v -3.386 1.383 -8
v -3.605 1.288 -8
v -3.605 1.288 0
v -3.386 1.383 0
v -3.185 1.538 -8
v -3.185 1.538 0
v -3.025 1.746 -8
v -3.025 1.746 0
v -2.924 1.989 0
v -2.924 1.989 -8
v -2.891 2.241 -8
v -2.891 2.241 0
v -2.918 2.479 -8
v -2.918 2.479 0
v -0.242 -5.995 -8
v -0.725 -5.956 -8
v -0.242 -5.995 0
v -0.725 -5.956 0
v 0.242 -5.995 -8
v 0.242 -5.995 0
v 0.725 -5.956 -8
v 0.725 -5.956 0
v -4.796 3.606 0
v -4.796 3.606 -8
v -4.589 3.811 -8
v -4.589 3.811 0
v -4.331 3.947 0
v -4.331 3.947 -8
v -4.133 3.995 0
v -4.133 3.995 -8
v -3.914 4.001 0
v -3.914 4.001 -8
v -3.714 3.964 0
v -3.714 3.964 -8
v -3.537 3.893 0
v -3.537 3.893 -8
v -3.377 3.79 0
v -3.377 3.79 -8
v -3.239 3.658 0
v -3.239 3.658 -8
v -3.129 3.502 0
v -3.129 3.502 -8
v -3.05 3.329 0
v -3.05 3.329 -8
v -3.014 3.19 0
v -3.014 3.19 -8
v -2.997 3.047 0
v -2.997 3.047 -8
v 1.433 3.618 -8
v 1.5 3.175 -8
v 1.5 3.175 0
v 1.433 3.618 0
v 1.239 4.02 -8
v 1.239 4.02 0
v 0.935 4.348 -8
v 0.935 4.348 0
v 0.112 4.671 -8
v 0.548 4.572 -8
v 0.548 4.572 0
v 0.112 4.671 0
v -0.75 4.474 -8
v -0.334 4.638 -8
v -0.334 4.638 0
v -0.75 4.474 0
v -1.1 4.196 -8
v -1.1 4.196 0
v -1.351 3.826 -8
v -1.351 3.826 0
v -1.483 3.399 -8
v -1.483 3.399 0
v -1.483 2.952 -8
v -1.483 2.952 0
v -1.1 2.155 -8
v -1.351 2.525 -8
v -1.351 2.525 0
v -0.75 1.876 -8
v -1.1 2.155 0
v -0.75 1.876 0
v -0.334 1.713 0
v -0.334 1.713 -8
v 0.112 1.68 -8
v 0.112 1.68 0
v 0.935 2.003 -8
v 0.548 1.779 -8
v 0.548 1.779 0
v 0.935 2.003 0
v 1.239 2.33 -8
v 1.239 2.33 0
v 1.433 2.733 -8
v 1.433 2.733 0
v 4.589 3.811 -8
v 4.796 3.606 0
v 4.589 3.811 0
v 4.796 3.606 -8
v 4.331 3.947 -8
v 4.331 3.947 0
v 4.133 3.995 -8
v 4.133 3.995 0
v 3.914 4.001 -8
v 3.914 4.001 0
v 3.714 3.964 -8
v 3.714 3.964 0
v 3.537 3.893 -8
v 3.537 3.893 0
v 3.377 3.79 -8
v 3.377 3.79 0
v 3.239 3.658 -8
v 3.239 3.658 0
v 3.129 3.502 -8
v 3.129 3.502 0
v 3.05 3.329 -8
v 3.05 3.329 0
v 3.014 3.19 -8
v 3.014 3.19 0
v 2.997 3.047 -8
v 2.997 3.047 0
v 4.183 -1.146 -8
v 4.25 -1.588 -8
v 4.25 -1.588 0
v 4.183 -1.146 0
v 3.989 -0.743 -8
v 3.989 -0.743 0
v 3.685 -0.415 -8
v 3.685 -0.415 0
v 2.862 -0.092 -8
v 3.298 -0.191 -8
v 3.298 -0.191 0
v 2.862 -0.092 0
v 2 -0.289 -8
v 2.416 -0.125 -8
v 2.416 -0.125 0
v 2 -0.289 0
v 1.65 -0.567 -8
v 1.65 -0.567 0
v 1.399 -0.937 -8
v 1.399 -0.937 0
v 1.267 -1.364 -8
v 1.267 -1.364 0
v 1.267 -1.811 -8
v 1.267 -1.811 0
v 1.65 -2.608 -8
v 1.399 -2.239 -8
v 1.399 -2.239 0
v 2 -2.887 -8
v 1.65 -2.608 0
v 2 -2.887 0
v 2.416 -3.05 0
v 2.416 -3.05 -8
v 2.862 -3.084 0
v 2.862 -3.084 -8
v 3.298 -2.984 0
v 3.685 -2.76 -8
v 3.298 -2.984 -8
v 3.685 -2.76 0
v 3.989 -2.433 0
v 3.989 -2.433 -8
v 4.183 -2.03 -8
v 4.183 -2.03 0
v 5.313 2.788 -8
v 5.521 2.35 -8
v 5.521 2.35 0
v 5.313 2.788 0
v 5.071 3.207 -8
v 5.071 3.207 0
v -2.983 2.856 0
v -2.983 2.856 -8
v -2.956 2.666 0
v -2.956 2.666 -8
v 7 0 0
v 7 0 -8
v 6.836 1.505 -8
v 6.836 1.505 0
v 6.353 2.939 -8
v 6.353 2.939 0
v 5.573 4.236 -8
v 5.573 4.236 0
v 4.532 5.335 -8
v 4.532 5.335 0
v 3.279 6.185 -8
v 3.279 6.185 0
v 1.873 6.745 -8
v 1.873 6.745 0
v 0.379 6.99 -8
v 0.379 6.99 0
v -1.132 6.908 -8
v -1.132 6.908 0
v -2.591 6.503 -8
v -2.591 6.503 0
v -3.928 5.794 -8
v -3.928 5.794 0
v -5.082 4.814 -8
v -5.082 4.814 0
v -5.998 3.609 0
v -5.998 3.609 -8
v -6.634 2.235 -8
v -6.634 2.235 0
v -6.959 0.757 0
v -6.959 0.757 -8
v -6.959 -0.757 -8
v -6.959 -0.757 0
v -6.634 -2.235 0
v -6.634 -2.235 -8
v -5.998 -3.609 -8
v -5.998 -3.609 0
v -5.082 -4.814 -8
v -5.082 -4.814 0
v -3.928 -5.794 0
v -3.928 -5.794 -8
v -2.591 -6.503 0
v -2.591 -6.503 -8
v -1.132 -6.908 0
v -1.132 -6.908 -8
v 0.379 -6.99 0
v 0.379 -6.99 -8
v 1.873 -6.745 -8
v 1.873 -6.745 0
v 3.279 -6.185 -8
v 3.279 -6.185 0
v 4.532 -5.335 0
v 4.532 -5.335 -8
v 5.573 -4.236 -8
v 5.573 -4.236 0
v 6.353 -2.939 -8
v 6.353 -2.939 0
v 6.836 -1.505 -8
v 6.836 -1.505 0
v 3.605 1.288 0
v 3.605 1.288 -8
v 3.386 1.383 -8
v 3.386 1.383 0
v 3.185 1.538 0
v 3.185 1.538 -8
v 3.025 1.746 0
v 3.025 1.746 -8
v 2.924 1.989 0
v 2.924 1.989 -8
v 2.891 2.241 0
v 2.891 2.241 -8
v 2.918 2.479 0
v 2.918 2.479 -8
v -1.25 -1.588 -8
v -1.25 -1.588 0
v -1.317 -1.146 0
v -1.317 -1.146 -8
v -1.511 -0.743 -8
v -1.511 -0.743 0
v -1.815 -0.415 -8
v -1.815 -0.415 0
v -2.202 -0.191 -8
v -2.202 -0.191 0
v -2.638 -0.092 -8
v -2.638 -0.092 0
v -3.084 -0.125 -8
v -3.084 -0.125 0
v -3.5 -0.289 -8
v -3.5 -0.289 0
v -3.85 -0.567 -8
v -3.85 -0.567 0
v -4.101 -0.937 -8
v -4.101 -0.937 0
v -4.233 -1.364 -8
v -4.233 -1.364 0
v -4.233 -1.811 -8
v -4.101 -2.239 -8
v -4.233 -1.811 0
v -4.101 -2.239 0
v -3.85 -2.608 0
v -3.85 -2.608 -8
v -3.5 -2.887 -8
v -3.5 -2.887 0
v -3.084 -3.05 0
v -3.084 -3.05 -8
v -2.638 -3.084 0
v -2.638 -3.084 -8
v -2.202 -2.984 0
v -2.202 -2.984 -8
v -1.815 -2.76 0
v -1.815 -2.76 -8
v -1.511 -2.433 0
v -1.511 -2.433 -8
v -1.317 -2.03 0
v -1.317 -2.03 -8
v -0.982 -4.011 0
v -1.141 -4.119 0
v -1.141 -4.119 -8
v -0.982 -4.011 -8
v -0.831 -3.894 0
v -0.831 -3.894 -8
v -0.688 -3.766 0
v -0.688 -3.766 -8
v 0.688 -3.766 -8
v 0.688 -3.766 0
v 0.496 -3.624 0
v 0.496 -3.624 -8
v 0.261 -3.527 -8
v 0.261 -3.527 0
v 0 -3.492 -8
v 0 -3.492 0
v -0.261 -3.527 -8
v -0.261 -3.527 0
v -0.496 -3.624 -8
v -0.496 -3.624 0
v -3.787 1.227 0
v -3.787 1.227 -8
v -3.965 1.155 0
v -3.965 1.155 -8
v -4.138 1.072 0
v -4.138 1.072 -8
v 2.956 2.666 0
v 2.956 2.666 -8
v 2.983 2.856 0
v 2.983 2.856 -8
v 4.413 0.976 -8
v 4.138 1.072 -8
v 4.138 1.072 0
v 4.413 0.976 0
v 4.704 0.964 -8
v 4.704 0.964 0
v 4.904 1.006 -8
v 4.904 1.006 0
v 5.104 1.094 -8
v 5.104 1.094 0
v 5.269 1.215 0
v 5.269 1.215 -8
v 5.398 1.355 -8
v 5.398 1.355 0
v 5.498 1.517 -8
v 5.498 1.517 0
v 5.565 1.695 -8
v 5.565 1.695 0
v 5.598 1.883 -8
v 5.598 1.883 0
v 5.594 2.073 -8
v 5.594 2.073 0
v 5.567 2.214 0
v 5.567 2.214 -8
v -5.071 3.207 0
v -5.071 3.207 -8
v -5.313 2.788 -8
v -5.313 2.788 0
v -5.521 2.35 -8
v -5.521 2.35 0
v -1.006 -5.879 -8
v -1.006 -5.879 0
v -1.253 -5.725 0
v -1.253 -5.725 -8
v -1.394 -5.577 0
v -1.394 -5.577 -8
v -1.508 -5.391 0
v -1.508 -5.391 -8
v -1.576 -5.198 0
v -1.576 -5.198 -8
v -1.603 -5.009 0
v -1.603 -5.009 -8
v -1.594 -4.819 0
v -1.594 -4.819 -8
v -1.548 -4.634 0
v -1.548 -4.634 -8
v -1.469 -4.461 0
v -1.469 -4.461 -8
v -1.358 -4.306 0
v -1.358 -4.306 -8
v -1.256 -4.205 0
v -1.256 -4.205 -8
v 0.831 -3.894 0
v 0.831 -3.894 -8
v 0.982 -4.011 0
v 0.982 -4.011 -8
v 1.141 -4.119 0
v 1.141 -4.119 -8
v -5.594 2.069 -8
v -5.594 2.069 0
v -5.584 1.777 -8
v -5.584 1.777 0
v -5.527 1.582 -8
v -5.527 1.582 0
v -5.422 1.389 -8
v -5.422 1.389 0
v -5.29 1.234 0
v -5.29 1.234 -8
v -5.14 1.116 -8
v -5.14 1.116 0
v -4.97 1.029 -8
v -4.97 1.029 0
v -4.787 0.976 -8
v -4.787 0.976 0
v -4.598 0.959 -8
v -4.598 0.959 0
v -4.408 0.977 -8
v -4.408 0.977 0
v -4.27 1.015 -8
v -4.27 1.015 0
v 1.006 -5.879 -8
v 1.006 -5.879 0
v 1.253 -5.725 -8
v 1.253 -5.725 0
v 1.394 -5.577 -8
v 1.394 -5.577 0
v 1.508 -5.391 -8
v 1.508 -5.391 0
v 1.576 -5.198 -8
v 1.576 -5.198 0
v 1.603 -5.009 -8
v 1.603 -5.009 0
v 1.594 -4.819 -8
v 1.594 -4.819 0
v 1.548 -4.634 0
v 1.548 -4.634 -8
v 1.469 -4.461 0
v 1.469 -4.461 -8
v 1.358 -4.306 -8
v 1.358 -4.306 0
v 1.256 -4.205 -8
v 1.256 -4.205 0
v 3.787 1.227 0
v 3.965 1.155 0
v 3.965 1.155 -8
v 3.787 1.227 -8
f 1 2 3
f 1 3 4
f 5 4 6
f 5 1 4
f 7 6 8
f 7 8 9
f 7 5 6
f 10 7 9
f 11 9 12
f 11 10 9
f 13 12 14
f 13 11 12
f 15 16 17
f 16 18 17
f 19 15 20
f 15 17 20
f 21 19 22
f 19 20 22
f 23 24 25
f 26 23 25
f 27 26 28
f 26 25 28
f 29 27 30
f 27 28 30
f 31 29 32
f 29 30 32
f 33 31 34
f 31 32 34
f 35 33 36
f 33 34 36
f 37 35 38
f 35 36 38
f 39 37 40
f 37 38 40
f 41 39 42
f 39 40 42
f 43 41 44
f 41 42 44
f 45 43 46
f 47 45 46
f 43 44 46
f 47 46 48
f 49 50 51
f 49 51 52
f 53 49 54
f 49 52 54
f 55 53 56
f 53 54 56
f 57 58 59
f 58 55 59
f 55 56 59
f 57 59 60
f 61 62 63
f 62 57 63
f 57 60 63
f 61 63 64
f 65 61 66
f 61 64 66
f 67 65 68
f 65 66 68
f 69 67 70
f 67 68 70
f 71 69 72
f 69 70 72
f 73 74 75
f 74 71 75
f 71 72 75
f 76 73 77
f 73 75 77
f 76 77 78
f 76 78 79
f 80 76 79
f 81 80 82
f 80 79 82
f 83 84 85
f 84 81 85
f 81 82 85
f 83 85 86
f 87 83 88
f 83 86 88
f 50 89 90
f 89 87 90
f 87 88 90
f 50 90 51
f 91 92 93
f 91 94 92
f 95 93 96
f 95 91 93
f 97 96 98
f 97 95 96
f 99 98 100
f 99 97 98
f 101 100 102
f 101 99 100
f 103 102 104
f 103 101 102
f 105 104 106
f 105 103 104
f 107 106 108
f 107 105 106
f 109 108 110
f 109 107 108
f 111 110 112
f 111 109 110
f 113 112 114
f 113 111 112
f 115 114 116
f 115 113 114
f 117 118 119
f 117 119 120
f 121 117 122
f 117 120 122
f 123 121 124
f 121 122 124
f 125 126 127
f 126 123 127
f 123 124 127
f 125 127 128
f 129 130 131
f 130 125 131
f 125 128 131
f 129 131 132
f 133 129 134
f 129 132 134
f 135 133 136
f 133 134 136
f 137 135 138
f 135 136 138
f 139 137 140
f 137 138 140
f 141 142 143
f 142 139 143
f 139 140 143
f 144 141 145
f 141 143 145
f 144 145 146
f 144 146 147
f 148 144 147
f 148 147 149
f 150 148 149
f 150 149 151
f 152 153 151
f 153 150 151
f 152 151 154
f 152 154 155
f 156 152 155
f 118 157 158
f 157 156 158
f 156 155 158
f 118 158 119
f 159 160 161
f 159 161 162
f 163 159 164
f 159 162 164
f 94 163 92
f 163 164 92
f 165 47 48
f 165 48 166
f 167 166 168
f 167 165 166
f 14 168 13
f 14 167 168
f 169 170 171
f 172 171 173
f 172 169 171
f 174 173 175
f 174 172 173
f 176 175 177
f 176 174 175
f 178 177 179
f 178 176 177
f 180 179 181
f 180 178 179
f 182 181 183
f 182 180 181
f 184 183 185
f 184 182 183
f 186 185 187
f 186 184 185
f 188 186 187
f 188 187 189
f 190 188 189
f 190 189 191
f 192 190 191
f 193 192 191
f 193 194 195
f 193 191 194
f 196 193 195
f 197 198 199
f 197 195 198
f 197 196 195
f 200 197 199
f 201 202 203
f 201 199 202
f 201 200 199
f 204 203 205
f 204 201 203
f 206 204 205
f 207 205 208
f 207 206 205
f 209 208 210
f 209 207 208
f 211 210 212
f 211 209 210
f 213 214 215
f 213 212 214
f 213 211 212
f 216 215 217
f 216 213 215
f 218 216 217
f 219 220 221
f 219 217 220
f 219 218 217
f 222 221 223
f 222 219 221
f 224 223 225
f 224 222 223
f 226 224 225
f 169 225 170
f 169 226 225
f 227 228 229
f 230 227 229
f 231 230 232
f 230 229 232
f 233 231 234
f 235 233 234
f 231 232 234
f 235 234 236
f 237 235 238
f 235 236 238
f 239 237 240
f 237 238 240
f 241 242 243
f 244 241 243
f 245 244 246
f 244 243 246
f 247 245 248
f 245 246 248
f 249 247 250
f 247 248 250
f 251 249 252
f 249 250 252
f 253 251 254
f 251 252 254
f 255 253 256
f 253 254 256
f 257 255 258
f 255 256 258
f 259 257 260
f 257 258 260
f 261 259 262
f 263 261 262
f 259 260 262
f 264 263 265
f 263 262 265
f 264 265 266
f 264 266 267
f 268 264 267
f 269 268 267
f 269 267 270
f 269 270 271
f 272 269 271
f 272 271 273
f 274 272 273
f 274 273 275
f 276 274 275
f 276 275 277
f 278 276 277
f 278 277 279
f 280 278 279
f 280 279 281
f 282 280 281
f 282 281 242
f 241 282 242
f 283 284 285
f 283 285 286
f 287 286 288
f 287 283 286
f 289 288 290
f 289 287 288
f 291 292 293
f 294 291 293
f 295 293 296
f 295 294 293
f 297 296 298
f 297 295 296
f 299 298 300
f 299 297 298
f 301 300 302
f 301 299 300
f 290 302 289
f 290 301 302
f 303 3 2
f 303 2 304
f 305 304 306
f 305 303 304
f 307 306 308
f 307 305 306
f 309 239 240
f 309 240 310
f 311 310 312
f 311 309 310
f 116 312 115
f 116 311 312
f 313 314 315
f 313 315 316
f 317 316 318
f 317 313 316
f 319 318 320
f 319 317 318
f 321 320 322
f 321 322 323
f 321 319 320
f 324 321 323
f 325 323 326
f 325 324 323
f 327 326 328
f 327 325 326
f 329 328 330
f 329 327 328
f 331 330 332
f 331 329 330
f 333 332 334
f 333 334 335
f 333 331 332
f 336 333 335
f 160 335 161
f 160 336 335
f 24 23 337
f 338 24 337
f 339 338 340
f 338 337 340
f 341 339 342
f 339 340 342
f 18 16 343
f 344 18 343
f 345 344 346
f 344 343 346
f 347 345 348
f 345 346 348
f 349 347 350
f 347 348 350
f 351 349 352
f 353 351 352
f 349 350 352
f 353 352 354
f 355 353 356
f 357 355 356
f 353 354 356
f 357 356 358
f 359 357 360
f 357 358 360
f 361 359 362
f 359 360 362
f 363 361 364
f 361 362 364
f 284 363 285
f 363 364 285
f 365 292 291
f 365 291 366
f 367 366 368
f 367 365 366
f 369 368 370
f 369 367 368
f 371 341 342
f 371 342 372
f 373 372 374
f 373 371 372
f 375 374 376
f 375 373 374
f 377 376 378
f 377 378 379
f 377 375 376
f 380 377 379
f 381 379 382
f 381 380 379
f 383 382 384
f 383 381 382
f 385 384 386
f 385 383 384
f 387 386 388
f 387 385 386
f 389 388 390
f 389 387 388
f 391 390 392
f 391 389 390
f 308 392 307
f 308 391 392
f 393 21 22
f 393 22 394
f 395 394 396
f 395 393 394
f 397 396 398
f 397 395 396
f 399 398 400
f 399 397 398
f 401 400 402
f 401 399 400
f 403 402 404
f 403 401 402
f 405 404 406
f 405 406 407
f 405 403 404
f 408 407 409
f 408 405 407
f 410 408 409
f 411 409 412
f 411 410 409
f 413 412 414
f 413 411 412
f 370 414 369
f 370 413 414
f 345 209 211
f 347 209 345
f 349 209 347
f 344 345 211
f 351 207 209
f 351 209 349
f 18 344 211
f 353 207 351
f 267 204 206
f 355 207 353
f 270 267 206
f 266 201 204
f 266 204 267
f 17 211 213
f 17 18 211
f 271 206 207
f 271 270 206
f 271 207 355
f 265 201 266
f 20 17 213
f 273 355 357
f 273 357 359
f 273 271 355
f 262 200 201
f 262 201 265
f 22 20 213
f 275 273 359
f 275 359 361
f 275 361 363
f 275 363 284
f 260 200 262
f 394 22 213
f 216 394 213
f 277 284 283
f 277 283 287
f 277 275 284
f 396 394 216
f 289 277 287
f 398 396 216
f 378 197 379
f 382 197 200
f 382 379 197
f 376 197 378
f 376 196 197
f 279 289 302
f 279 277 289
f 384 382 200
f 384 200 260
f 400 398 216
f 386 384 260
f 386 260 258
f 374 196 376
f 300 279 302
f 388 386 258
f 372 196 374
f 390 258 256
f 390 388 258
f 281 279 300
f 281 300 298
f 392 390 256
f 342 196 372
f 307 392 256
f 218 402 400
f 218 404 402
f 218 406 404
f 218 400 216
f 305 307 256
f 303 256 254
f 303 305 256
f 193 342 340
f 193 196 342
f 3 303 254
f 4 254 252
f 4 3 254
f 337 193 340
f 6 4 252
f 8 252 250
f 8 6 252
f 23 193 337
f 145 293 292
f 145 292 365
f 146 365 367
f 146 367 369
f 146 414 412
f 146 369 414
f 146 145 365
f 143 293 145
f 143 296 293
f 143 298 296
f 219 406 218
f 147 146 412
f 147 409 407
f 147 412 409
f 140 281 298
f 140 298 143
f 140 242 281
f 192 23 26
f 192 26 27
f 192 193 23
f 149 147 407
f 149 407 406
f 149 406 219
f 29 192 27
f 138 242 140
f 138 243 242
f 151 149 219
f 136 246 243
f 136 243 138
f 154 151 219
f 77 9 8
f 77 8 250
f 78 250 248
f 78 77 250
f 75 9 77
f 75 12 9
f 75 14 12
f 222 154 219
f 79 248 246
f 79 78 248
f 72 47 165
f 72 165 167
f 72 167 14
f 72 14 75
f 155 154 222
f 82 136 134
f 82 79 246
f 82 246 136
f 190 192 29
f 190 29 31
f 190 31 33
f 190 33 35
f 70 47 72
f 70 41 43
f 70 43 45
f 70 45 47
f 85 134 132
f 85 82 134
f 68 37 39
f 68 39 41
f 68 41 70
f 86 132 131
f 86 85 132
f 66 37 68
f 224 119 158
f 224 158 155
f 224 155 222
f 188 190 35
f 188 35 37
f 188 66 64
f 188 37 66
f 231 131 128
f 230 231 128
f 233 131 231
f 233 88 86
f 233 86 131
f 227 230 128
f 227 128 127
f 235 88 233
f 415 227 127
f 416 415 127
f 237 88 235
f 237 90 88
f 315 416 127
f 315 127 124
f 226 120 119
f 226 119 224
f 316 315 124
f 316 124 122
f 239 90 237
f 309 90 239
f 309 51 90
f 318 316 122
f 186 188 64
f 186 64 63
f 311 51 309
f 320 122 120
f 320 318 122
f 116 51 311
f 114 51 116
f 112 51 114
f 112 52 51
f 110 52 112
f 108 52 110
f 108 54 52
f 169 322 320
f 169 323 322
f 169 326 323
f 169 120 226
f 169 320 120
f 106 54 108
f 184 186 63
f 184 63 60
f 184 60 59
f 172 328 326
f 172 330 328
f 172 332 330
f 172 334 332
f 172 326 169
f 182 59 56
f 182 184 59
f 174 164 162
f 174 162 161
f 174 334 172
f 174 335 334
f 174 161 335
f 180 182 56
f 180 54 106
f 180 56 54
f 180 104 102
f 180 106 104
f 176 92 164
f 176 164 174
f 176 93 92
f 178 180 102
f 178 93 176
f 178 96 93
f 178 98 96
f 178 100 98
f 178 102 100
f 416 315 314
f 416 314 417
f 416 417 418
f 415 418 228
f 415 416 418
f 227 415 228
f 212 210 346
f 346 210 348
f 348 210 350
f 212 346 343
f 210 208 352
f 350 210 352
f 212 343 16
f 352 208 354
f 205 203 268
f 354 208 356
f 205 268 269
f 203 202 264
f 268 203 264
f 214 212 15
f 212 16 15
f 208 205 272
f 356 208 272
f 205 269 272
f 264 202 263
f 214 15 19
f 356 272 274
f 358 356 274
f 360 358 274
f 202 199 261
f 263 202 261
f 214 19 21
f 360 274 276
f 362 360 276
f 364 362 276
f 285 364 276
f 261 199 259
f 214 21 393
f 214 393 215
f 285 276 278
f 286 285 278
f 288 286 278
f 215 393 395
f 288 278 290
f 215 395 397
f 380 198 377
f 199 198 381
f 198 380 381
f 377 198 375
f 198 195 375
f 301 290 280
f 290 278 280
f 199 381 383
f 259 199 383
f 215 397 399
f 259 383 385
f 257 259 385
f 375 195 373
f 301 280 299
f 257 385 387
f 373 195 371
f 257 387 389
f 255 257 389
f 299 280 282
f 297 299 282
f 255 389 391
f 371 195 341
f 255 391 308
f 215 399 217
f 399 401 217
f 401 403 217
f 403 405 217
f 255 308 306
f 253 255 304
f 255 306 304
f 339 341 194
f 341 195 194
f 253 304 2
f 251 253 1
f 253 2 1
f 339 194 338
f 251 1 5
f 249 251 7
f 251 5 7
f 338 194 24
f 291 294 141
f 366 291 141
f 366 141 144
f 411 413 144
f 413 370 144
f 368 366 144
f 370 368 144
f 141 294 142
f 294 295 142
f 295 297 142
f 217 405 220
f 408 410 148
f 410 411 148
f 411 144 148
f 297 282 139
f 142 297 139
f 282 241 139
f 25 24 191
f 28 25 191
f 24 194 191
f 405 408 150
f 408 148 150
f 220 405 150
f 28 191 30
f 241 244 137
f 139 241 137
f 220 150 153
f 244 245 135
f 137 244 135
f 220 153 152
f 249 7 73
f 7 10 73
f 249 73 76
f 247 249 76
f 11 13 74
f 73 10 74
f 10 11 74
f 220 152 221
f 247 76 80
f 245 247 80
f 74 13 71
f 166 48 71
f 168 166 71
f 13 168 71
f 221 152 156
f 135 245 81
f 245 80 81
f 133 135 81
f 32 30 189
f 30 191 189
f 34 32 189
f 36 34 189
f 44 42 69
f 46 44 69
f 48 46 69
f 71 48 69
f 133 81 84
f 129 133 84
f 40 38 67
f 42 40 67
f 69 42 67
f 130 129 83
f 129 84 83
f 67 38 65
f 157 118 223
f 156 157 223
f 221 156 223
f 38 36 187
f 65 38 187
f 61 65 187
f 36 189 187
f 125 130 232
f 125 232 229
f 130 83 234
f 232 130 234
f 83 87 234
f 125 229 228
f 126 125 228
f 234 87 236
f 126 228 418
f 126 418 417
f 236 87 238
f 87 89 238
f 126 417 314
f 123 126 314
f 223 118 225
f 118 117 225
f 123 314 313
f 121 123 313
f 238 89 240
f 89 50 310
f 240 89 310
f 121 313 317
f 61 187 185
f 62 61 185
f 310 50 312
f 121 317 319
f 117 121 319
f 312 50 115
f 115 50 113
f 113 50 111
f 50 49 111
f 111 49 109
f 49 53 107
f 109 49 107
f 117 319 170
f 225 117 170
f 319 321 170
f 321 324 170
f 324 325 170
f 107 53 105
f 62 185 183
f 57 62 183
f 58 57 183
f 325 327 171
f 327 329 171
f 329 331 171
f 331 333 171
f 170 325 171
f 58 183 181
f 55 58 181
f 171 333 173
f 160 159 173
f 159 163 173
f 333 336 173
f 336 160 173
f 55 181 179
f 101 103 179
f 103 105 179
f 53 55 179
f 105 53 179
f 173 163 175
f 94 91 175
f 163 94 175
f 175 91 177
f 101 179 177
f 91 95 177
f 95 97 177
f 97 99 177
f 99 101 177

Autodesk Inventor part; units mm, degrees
ref_plane "YZ Plane" through (0, 0, 0) normal (1, 0, 0) x (0, 1, 0)
ref_plane "XZ Plane" through (0, 0, 0) normal (0, 1, 0) x (-1, 0, 0)
ref_plane "XY Plane" through (0, 0, 0) normal (0, 0, 1) x (1, 0, 0)
sketch "スケッチ1" plane through (0, 0, 0) normal (0, 0, 1) x (1, 0, 0)
  line L0 (0, 3.1754) -> (2.75, -1.5877)
  line L1 (2.75, -1.5877) -> (-2.75, -1.5877)
  line L2 (-2.75, -1.5877) -> (0, 3.1754)
  circle A0 centre (0, 3.1754) radius 1.5
  circle A1 centre (-2.75, -1.5877) radius 1.5
  circle A2 centre (2.75, -1.5877) radius 1.5
  circle A3 centre (0, 3.1754) radius 4
  circle A4 centre (-2.75, -1.5877) radius 4
  circle A5 centre (2.75, -1.5877) radius 4
  circle A6 centre (0, 0) radius 7.5
  circle A7 centre (0, 0) radius 4.6754
  circle A8 centre (0, 0) radius 7
  dimension "d0" = 3
  dimension "d1" = 3
  dimension "d2" = 3
  dimension "d3" = 2.5
  dimension "d4" = 2.5
  dimension "d5" = 2.5
  dimension "d6" = 15
  dimension "d7" = 2.8246
  dimension "d8" = 14
  dimension "d9" = 2.3246
extrude "押し出し1" add sketch "スケッチ1" against normal blind 8 contours A5 A3 L0 | A5 A4 A0 | A0 A7 A3 A5 | L0 A3 A4 A5 | A4 A5 A3 L2 | A4 A3 A7 A0 | L2 A3 A4 | A3 A5 A7 A2 | A2 A4 A3 | A3 A7 A5 | A4 A3 A5 | A3 A5 A1 | A1 A7 A4 A3 | A7 A3 A8 | A4 A7 A3 | A4 A5 L1 | L1 A5 A3 A4 | A2 A7 A5 A4 | A3 A8 A5 A7 | A5 A8 A7 | A5 A4 A7 A1 | A7 A4 A8 | A7 A4 A8 A3 | A5 A7 A4 | A7 A5 A8 A4
sketch "スケッチ2" plane through (0, 0, 0) normal (0, 0, 1) x (1, 0, 0)
  circle A0 centre (0, 0) radius 7 projected
  circle A1 centre (2.75, -1.5877) radius 1.5 projected
  circle A2 centre (-2.75, -1.5877) radius 1.5 projected
  circle A3 centre (0, 3.1754) radius 1.5 projected
  circle A4 centre (0, 3.1754) radius 4
  circle A5 centre (-2.75, -1.5877) radius 4
  circle A6 centre (2.75, -1.5877) radius 4
  circle A7 centre (0, 0) radius 4.5
  dimension "d12" = 2.5
  dimension "d13" = 2.5
  dimension "d14" = 2.5
  dimension "d15" = 2.5
sketch "スケッチ3" plane through (0, 0, 0) normal (0, 0, 1) x (1, 0, 0)
  circle A0 centre (0, 3.1754) radius 1.5 projected
  circle A1 centre (-2.75, -1.5877) radius 1.5 projected
  circle A2 centre (2.75, -1.5877) radius 1.5 projected
  circle A3 centre (0, 0) radius 7 projected
  circle A4 centre (0, 3.1754) radius 3
  circle A5 centre (-2.75, -1.5877) radius 3
  circle A6 centre (2.75, -1.5877) radius 3
  circle A7 centre (0, 0) radius 7 projected
  circle A8 centre (0, 0) radius 6
  point P0 (-4.3667, -4.1148)
  point P1 (4.3667, -4.1148)
  point P2 (0, -2.7867)
  point P3 (5.7469, -1.7243)
  point P4 (1.3801, 5.8391)
  point P5 (2.4133, 1.3933)
  point P6 (-1.3801, 5.8391)
  point P7 (-5.7469, -1.7243)
  point P8 (-2.4133, 1.3933)
  dimension "d17" = 1
  dimension "d19" = 1.5
  dimension "d20" = 1.5
  dimension "d21" = 1.5
extrude "押し出し2" cut sketch "スケッチ3" against normal blind 10 contours A4 A8 A6 | A4 A5 A8 | A5 A6 A8
fillet "フィレット1" radius 1 9 edges at (-1.3801, 5.8391, -4) (1.3801, 5.8391, -4) (5.7469, -1.7243, -4) (2.4133, 1.3933, -4) (-2.4133, 1.3933, -4) (-5.7469, -1.7243, -4) (-4.3667, -4.1148, -4) (0, -2.7867, -4) (4.3667, -4.1148, -4)
equation "\"d3\" = d4"
equation "\"d5\" = d4"
equation "\"d20\" = d19"
equation "\"d21\" = d19"
properties part number "アーム 小さいカム" material "アルミニウム 2014-T6"
